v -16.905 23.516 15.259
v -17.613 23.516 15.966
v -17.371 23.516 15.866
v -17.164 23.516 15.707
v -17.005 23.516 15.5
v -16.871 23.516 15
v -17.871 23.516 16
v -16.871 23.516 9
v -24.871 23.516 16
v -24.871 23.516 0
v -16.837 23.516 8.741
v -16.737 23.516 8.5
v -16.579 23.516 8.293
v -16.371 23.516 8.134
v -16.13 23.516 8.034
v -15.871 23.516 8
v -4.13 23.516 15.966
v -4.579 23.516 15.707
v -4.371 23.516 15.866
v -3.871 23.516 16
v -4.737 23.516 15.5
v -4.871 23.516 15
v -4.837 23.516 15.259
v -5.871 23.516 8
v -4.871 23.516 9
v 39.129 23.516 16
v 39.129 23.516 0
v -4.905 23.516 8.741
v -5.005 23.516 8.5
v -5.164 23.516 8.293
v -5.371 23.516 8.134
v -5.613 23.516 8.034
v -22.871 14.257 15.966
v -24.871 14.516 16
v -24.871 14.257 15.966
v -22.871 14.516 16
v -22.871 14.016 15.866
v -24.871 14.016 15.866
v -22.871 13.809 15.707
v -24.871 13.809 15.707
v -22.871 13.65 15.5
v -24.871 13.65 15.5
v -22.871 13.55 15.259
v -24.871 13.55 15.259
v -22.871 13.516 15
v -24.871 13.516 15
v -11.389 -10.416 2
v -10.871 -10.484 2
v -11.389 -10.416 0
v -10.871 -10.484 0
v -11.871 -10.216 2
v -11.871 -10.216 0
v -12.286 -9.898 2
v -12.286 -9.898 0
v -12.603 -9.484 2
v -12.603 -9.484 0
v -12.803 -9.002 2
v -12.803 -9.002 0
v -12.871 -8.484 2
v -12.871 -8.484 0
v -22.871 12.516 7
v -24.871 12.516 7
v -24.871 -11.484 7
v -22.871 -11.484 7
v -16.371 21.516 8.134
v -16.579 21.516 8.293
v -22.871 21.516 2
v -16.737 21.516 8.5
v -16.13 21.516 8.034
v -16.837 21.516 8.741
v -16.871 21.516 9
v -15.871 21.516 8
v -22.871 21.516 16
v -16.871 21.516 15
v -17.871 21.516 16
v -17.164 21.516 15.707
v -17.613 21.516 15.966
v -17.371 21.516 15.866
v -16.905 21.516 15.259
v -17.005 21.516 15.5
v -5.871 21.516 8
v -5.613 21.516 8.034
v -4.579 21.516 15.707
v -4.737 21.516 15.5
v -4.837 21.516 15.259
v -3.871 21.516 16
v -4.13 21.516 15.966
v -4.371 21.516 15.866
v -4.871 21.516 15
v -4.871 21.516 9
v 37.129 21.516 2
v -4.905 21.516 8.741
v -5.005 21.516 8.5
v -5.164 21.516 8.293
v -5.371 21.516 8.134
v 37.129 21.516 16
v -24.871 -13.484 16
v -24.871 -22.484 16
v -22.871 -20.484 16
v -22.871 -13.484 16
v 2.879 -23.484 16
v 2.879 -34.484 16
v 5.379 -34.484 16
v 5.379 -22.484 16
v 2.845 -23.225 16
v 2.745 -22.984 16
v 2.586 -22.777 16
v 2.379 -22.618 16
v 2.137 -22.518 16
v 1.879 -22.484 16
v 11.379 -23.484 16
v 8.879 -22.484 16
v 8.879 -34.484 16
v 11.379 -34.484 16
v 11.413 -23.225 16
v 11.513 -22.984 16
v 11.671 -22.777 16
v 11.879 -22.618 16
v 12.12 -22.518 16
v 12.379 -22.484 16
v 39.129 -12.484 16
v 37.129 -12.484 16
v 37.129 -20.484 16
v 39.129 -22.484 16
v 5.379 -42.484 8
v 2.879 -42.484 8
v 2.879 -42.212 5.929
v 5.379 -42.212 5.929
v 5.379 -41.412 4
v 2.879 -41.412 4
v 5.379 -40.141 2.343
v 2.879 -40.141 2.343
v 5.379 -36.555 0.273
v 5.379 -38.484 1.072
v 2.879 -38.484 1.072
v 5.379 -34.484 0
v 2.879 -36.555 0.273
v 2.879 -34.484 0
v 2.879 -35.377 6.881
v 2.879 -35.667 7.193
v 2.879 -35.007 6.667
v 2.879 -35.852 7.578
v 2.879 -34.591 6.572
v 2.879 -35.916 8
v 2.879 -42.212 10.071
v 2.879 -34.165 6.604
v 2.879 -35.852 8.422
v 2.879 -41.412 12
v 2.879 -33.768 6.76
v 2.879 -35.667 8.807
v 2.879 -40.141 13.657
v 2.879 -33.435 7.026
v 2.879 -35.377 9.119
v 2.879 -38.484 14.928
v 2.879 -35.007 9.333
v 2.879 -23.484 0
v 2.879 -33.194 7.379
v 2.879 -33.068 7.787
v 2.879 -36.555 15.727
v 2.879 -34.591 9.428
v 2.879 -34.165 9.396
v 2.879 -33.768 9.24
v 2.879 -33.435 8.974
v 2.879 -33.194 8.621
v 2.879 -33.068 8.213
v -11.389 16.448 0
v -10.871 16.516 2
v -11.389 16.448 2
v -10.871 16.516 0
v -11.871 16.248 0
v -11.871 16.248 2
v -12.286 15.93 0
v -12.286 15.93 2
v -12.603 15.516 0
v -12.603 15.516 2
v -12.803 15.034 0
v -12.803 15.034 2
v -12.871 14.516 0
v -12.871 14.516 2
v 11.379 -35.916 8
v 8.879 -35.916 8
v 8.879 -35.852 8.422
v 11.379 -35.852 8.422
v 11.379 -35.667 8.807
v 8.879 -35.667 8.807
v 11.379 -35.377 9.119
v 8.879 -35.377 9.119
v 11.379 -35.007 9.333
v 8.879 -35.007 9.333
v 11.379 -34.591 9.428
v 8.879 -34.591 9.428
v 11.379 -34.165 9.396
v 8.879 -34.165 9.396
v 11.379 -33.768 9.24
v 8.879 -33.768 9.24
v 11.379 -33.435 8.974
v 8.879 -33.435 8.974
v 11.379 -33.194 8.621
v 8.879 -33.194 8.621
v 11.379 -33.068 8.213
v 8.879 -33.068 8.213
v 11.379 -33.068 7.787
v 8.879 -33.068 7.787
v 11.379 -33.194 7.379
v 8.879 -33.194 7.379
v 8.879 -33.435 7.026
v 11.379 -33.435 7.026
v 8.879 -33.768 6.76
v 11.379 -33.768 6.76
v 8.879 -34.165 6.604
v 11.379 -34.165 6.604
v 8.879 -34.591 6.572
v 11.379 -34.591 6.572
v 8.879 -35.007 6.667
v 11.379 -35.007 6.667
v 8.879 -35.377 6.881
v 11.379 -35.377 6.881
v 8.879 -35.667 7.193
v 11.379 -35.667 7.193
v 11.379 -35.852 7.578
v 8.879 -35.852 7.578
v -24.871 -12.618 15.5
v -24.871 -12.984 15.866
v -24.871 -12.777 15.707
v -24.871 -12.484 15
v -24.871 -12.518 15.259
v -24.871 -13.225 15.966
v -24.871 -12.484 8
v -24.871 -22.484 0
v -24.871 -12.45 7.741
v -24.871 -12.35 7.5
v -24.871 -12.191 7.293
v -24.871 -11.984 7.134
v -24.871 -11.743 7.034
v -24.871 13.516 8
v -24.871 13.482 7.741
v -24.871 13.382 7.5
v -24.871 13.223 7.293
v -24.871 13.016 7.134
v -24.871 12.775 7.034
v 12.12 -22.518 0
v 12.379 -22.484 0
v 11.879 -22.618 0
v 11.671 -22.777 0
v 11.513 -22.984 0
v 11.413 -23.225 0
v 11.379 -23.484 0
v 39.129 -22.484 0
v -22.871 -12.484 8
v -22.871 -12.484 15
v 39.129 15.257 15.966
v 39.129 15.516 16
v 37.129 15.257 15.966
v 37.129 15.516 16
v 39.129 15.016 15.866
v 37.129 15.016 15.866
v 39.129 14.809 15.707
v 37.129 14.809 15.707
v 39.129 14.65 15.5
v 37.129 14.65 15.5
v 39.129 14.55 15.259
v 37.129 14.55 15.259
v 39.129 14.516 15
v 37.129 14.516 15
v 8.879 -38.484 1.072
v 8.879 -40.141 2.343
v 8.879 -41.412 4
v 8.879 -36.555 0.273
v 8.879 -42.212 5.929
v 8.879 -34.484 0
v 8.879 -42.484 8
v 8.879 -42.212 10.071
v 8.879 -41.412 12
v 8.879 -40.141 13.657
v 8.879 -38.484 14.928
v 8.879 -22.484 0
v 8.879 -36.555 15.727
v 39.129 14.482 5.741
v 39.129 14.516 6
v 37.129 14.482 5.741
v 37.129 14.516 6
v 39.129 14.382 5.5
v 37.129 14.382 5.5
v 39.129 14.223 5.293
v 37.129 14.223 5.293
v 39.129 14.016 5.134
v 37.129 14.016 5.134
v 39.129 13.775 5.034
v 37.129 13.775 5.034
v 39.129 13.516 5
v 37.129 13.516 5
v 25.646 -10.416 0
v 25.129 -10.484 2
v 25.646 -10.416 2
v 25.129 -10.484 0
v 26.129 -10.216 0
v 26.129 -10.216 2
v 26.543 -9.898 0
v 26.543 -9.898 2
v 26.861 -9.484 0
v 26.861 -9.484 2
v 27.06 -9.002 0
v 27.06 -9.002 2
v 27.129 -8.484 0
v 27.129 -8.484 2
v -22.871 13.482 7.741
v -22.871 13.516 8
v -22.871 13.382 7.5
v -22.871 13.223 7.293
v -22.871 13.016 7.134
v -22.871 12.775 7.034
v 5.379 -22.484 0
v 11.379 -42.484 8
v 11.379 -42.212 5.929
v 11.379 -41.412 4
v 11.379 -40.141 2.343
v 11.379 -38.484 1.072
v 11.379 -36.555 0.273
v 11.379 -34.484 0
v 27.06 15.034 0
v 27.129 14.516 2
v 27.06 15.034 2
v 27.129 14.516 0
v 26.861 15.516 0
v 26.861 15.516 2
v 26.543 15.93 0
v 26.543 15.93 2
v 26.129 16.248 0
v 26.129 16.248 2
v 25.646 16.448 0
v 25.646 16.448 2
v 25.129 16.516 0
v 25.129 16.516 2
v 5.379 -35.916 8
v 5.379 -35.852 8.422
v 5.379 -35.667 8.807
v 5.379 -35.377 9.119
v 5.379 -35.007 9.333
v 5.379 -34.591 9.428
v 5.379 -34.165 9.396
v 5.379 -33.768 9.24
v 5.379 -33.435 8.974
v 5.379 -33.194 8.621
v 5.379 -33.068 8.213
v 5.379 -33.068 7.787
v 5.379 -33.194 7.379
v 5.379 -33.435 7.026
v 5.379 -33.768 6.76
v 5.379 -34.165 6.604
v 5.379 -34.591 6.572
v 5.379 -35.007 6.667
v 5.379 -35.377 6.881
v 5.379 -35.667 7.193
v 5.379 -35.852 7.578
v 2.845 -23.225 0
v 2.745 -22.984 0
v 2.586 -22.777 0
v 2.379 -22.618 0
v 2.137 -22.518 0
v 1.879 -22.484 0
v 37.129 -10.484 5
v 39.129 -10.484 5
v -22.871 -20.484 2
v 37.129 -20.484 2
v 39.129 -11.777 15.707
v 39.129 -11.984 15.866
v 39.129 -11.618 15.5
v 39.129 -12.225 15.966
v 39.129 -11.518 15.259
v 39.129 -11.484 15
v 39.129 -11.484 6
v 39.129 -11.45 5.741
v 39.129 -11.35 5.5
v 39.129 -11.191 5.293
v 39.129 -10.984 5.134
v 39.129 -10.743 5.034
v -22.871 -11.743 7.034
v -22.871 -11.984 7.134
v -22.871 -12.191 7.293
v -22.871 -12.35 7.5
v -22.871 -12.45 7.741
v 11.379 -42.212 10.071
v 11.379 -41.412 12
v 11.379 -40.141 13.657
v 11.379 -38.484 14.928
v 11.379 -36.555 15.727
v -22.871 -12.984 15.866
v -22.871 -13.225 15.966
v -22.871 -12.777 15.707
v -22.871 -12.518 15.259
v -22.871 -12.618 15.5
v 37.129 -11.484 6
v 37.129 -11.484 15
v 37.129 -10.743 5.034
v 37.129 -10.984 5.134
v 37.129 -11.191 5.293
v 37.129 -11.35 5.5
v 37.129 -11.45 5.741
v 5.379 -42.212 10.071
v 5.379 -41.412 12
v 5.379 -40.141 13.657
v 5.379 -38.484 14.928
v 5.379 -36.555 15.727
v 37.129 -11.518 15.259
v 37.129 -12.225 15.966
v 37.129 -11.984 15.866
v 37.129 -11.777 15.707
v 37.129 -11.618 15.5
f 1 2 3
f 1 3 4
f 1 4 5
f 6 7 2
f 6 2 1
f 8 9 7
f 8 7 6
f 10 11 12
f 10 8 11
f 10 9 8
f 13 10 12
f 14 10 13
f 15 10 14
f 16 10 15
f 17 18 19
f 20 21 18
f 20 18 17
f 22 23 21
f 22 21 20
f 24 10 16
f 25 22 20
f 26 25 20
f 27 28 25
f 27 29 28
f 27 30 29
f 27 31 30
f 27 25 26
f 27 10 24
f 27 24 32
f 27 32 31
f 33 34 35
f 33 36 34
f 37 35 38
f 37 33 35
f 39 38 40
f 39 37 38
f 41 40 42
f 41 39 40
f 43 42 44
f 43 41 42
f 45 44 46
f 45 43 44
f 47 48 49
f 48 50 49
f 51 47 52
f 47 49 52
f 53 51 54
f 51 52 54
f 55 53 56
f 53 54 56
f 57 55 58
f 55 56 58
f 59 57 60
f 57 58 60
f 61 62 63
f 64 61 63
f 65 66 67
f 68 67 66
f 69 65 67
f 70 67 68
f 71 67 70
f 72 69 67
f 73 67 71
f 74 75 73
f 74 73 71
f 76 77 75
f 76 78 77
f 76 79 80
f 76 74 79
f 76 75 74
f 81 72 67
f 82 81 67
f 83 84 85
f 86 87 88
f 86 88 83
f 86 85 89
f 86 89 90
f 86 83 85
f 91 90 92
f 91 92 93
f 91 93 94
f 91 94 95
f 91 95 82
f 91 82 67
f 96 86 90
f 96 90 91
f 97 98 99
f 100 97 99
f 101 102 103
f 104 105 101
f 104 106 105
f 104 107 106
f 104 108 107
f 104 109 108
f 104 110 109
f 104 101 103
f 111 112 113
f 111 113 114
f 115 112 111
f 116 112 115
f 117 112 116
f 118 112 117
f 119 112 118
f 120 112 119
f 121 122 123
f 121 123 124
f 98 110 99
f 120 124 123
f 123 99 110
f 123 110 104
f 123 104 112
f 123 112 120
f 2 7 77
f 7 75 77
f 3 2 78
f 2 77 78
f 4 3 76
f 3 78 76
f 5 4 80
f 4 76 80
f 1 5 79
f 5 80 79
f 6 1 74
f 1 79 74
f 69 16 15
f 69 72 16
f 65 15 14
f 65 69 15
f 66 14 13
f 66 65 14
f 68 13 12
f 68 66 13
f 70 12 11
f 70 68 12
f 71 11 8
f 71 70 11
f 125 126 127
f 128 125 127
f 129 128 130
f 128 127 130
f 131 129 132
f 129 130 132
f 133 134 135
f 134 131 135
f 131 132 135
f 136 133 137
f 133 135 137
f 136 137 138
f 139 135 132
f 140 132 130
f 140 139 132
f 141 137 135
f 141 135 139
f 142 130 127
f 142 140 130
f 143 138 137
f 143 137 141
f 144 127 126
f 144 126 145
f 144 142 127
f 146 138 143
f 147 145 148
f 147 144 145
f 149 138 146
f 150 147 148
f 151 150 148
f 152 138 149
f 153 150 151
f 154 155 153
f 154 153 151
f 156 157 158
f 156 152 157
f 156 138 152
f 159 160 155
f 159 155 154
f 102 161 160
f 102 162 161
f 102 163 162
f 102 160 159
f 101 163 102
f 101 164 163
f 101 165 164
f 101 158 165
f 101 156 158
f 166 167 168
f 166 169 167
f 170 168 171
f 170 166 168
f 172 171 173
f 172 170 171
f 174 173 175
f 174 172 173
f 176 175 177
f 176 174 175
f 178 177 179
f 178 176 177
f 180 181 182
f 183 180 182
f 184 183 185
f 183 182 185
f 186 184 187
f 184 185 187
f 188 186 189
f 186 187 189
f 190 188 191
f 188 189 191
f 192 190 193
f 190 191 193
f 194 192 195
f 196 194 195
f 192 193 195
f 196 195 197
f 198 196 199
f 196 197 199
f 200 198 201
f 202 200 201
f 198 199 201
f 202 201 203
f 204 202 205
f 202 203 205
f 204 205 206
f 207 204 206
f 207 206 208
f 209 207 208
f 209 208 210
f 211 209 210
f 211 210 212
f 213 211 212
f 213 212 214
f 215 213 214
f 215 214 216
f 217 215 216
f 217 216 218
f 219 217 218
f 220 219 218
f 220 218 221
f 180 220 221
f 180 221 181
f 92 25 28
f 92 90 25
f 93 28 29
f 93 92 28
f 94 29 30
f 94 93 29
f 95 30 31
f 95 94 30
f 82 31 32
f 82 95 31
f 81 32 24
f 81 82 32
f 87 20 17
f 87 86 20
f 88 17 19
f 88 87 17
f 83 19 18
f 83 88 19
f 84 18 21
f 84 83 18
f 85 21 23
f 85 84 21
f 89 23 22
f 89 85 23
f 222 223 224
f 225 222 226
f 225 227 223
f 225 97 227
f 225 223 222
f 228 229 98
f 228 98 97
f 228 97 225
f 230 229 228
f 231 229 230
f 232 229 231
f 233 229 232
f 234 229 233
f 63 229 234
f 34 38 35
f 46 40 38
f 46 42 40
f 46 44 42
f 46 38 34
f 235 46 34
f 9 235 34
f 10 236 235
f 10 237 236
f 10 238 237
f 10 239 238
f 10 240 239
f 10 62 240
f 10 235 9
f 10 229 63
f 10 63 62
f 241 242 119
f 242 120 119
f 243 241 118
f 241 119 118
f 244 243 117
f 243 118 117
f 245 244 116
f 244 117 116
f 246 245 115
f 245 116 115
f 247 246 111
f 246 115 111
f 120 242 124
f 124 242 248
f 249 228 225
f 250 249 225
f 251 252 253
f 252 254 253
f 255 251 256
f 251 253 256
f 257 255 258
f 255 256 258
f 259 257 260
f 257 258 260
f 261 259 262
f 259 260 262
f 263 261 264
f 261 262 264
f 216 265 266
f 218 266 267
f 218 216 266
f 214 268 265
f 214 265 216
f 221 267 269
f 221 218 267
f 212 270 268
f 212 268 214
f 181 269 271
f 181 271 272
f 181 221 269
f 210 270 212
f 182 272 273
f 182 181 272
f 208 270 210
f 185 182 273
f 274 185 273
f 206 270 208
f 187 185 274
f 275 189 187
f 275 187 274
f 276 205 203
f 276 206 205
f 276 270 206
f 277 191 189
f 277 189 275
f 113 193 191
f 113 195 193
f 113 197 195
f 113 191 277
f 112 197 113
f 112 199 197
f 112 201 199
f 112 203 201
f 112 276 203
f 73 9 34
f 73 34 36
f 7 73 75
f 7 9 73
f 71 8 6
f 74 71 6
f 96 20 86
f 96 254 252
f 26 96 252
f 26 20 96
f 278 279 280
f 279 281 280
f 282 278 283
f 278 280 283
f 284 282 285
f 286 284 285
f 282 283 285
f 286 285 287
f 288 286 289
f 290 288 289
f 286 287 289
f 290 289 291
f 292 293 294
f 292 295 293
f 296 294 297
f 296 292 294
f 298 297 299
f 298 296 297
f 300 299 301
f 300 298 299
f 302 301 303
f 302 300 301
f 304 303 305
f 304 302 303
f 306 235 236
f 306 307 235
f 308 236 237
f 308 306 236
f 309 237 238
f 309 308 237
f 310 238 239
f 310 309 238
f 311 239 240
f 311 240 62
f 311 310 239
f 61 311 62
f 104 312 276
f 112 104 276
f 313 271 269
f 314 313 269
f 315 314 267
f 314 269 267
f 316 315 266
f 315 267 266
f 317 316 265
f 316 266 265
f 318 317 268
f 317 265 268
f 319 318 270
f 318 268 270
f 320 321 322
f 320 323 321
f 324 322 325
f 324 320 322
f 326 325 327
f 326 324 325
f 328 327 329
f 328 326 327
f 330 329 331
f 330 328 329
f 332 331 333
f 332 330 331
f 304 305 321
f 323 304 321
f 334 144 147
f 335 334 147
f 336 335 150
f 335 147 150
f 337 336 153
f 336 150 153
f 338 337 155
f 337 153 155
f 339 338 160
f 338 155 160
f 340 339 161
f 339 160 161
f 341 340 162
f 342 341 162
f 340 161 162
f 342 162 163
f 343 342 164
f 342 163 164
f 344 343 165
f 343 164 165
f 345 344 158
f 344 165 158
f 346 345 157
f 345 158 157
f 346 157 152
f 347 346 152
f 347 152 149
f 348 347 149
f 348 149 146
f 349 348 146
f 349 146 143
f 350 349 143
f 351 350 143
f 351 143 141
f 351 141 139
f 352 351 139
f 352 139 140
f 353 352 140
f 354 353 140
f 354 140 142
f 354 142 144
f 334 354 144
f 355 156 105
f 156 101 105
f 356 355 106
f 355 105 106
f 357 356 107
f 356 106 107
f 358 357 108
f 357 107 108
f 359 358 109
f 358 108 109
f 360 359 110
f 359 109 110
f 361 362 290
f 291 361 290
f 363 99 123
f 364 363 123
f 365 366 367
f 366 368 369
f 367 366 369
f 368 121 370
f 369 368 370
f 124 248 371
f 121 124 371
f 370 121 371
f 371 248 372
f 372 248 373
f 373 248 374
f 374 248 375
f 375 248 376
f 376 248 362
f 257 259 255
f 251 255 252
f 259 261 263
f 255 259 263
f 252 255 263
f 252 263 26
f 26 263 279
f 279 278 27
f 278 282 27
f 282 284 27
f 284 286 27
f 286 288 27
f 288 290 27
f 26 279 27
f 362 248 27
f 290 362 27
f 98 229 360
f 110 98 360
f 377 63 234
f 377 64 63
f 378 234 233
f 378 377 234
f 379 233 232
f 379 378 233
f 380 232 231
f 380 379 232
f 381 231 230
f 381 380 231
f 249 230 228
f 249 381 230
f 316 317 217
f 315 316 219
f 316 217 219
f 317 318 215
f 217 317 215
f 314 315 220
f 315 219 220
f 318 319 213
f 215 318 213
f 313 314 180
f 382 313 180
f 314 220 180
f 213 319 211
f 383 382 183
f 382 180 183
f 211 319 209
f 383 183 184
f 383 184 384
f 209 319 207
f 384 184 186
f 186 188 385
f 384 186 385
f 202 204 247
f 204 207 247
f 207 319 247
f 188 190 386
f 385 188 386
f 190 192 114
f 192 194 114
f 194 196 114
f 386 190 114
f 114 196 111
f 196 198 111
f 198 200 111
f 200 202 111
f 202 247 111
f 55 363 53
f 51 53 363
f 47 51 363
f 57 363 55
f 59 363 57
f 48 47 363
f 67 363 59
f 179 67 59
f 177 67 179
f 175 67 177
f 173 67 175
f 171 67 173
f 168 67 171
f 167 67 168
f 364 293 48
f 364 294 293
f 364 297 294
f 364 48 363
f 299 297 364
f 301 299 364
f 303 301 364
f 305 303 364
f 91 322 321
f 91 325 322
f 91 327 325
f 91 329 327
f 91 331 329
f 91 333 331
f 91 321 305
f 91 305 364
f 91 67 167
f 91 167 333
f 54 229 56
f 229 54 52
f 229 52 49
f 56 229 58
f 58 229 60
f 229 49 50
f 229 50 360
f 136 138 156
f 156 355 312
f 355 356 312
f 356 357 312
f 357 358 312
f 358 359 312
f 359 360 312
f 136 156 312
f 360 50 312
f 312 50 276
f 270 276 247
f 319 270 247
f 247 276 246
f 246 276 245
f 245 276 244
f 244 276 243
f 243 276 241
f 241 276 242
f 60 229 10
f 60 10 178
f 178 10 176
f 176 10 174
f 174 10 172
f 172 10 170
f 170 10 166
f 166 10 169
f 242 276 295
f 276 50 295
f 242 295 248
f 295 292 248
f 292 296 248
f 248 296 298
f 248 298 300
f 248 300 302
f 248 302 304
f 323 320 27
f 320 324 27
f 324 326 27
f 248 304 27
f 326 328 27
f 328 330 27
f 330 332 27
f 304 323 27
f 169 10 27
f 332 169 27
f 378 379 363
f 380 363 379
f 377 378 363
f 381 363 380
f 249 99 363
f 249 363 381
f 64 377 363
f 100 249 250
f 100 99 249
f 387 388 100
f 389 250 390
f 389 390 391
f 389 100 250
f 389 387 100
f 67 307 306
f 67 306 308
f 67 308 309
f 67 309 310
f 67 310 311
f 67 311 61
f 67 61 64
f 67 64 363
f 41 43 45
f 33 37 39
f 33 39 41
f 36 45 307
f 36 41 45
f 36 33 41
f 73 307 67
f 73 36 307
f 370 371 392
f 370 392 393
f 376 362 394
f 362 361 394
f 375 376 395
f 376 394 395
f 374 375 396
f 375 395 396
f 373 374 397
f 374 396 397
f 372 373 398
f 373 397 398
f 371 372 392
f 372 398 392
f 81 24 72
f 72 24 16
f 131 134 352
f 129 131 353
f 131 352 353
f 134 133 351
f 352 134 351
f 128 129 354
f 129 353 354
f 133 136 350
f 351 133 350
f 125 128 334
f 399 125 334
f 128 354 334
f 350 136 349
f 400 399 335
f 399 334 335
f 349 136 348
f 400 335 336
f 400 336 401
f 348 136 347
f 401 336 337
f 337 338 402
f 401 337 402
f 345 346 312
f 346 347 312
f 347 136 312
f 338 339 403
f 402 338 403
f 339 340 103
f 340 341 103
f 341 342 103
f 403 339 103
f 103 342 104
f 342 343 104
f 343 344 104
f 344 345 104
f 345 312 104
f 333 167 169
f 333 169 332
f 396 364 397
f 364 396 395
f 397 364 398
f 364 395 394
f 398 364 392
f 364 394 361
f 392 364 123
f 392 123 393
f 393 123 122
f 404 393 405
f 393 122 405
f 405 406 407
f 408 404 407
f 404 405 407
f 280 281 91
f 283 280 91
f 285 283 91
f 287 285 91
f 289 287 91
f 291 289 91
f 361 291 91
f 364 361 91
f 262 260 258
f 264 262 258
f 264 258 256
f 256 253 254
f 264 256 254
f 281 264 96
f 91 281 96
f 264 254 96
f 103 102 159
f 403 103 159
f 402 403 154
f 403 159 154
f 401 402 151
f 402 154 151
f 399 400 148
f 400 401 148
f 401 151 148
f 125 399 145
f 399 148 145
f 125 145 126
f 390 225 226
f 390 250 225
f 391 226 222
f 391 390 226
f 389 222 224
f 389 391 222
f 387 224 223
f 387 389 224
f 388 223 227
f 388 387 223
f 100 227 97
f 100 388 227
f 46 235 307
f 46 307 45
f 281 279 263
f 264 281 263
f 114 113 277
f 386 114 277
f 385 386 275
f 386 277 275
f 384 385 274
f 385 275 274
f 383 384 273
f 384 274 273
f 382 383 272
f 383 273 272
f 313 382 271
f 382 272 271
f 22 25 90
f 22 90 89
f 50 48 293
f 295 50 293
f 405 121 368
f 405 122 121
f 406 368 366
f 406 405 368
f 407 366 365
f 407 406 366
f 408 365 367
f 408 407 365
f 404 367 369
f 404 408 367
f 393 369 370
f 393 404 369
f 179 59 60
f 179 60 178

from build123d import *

# Parameters (mm, degrees)
F0_W      = 64
F0_H      = 46
F1_DEPTH  = 16
F2_W      = 60
F2_H      = 42
F3_DEPTH  = 14
F4_W      = 40
F4_H      = 27
F5_DEPTH  = 25
F6_R      = 2
F7_W      = 2.5
F7_H      = 16
F8_DEPTH  = 20
F9_R      = 1.4317723001
F10_DEPTH = 25
F11_W     = 26
F11_H     = 11
F12_DEPTH = 25
F13_W     = 26
F13_H     = 9
F14_DEPTH = 25
F15_W     = 12
F15_H     = 8
F16_DEPTH = 25
F17_R     = 1


with BuildPart() as f1:
    # F0 (on Top) → F1 (new body)
    with BuildSketch(Plane.XY):
        with Locations((7.1285768165, 0.5159020871)):
            Rectangle(F0_W, F0_H)
    extrude(amount=F1_DEPTH)

    # F2 (on face) → F3 (cut)
    with BuildSketch(Plane.XY.offset(16)):
        with Locations((7.1285768165, 0.5159020871)):
            Rectangle(F2_W, F2_H)
    extrude(amount=-F3_DEPTH, mode=Mode.SUBTRACT)

    # F4 (on face) → F5 (cut)
    with BuildSketch(Plane.XY.offset(2)):
        with Locations((7.1285768165, 3.0159020871)):
            Rectangle(F4_W, F4_H)
    extrude(amount=-F5_DEPTH, mode=Mode.SUBTRACT)

    # F6
    f6_edges = [f1.edges().sort_by_distance(p)[0] for p in [
        (-12.871423, 16.515902, 1),
        (-12.871423, -10.484098, 1),
        (27.128577, -10.484098, 1),
        (27.128577, 16.515902, 1),
    ]]
    fillet(f6_edges, radius=F6_R)

    # F7 (on face) → F8 (join)
    with BuildSketch(Plane.XZ.offset(22.4840979129)):
        with Locations((4.1285768165, 8)):
            Rectangle(F7_W, F7_H)
        with Locations((10.1285768165, 8)):
            Rectangle(F7_W, F7_H)
    extrude(amount=F8_DEPTH)

    # F9 (on face) → F10 (cut)
    with BuildSketch(Plane(origin=(2.8785768165, 0, 0), x_dir=(0, -1, 0), z_dir=(-1, 0, 0))):
        with Locations((34.4840979129, 8)):
            Circle(F9_R)
        with BuildLine():
            ThreePointArc((34.4840979129, 16), (40.1409521624, 13.6568542495), (42.4840979129, 8))
            Line((42.4840979129, 8), (42.4840979129, 16))
            Line((42.4840979129, 16), (34.4840979129, 16))
        make_face()
        with BuildLine():
            Line((42.4840979129, 0), (42.4840979129, 8))
            ThreePointArc((42.4840979129, 8), (40.1409521624, 2.3431457505), (34.4840979129, 0))
            Line((34.4840979129, 0), (42.4840979129, 0))
        make_face()
    extrude(amount=-F10_DEPTH, mode=Mode.SUBTRACT)

    # F11 (on face) → F12 (cut)
    with BuildSketch(Plane.YZ.offset(39.1285768165)):
        with Locations((1.5159020871, 10.5)):
            Rectangle(F11_W, F11_H)
    extrude(amount=-F12_DEPTH, mode=Mode.SUBTRACT)

    # F13 (on face) → F14 (cut)
    with BuildSketch(Plane(origin=(-24.8714231835, 0, 0), x_dir=(0, -1, 0), z_dir=(-1, 0, 0))):
        with Locations((-0.5159020871, 11.5)):
            Rectangle(F13_W, F13_H)
    extrude(amount=-F14_DEPTH, mode=Mode.SUBTRACT)

    # F15 (on face) → F16 (cut)
    with BuildSketch(Plane(origin=(0, 23.5159020871, 0), x_dir=(-1, 0, 0), z_dir=(0, 1, 0))):
        with Locations((10.8714231835, 12)):
            Rectangle(F15_W, F15_H)
    extrude(amount=-F16_DEPTH, mode=Mode.SUBTRACT)

    # F17
    f17_edges = [f1.edges().sort_by_distance(p)[0] for p in [
        (-23.871423, 13.515902, 16),
        (-23.871423, -12.484098, 16),
        (38.128577, 14.515902, 16),
        (38.128577, -11.484098, 16),
        (-23.871423, 13.515902, 7),
        (38.128577, 14.515902, 5),
        (-23.871423, -12.484098, 7),
        (38.128577, -11.484098, 5),
        (-4.871423, 22.515902, 16),
        (-16.871423, 22.515902, 16),
        (-4.871423, 22.515902, 8),
        (-16.871423, 22.515902, 8),
        (2.878577, -22.484098, 8),
        (11.378577, -22.484098, 8),
    ]]
    fillet(f17_edges, radius=F17_R)


solid = f1.part
